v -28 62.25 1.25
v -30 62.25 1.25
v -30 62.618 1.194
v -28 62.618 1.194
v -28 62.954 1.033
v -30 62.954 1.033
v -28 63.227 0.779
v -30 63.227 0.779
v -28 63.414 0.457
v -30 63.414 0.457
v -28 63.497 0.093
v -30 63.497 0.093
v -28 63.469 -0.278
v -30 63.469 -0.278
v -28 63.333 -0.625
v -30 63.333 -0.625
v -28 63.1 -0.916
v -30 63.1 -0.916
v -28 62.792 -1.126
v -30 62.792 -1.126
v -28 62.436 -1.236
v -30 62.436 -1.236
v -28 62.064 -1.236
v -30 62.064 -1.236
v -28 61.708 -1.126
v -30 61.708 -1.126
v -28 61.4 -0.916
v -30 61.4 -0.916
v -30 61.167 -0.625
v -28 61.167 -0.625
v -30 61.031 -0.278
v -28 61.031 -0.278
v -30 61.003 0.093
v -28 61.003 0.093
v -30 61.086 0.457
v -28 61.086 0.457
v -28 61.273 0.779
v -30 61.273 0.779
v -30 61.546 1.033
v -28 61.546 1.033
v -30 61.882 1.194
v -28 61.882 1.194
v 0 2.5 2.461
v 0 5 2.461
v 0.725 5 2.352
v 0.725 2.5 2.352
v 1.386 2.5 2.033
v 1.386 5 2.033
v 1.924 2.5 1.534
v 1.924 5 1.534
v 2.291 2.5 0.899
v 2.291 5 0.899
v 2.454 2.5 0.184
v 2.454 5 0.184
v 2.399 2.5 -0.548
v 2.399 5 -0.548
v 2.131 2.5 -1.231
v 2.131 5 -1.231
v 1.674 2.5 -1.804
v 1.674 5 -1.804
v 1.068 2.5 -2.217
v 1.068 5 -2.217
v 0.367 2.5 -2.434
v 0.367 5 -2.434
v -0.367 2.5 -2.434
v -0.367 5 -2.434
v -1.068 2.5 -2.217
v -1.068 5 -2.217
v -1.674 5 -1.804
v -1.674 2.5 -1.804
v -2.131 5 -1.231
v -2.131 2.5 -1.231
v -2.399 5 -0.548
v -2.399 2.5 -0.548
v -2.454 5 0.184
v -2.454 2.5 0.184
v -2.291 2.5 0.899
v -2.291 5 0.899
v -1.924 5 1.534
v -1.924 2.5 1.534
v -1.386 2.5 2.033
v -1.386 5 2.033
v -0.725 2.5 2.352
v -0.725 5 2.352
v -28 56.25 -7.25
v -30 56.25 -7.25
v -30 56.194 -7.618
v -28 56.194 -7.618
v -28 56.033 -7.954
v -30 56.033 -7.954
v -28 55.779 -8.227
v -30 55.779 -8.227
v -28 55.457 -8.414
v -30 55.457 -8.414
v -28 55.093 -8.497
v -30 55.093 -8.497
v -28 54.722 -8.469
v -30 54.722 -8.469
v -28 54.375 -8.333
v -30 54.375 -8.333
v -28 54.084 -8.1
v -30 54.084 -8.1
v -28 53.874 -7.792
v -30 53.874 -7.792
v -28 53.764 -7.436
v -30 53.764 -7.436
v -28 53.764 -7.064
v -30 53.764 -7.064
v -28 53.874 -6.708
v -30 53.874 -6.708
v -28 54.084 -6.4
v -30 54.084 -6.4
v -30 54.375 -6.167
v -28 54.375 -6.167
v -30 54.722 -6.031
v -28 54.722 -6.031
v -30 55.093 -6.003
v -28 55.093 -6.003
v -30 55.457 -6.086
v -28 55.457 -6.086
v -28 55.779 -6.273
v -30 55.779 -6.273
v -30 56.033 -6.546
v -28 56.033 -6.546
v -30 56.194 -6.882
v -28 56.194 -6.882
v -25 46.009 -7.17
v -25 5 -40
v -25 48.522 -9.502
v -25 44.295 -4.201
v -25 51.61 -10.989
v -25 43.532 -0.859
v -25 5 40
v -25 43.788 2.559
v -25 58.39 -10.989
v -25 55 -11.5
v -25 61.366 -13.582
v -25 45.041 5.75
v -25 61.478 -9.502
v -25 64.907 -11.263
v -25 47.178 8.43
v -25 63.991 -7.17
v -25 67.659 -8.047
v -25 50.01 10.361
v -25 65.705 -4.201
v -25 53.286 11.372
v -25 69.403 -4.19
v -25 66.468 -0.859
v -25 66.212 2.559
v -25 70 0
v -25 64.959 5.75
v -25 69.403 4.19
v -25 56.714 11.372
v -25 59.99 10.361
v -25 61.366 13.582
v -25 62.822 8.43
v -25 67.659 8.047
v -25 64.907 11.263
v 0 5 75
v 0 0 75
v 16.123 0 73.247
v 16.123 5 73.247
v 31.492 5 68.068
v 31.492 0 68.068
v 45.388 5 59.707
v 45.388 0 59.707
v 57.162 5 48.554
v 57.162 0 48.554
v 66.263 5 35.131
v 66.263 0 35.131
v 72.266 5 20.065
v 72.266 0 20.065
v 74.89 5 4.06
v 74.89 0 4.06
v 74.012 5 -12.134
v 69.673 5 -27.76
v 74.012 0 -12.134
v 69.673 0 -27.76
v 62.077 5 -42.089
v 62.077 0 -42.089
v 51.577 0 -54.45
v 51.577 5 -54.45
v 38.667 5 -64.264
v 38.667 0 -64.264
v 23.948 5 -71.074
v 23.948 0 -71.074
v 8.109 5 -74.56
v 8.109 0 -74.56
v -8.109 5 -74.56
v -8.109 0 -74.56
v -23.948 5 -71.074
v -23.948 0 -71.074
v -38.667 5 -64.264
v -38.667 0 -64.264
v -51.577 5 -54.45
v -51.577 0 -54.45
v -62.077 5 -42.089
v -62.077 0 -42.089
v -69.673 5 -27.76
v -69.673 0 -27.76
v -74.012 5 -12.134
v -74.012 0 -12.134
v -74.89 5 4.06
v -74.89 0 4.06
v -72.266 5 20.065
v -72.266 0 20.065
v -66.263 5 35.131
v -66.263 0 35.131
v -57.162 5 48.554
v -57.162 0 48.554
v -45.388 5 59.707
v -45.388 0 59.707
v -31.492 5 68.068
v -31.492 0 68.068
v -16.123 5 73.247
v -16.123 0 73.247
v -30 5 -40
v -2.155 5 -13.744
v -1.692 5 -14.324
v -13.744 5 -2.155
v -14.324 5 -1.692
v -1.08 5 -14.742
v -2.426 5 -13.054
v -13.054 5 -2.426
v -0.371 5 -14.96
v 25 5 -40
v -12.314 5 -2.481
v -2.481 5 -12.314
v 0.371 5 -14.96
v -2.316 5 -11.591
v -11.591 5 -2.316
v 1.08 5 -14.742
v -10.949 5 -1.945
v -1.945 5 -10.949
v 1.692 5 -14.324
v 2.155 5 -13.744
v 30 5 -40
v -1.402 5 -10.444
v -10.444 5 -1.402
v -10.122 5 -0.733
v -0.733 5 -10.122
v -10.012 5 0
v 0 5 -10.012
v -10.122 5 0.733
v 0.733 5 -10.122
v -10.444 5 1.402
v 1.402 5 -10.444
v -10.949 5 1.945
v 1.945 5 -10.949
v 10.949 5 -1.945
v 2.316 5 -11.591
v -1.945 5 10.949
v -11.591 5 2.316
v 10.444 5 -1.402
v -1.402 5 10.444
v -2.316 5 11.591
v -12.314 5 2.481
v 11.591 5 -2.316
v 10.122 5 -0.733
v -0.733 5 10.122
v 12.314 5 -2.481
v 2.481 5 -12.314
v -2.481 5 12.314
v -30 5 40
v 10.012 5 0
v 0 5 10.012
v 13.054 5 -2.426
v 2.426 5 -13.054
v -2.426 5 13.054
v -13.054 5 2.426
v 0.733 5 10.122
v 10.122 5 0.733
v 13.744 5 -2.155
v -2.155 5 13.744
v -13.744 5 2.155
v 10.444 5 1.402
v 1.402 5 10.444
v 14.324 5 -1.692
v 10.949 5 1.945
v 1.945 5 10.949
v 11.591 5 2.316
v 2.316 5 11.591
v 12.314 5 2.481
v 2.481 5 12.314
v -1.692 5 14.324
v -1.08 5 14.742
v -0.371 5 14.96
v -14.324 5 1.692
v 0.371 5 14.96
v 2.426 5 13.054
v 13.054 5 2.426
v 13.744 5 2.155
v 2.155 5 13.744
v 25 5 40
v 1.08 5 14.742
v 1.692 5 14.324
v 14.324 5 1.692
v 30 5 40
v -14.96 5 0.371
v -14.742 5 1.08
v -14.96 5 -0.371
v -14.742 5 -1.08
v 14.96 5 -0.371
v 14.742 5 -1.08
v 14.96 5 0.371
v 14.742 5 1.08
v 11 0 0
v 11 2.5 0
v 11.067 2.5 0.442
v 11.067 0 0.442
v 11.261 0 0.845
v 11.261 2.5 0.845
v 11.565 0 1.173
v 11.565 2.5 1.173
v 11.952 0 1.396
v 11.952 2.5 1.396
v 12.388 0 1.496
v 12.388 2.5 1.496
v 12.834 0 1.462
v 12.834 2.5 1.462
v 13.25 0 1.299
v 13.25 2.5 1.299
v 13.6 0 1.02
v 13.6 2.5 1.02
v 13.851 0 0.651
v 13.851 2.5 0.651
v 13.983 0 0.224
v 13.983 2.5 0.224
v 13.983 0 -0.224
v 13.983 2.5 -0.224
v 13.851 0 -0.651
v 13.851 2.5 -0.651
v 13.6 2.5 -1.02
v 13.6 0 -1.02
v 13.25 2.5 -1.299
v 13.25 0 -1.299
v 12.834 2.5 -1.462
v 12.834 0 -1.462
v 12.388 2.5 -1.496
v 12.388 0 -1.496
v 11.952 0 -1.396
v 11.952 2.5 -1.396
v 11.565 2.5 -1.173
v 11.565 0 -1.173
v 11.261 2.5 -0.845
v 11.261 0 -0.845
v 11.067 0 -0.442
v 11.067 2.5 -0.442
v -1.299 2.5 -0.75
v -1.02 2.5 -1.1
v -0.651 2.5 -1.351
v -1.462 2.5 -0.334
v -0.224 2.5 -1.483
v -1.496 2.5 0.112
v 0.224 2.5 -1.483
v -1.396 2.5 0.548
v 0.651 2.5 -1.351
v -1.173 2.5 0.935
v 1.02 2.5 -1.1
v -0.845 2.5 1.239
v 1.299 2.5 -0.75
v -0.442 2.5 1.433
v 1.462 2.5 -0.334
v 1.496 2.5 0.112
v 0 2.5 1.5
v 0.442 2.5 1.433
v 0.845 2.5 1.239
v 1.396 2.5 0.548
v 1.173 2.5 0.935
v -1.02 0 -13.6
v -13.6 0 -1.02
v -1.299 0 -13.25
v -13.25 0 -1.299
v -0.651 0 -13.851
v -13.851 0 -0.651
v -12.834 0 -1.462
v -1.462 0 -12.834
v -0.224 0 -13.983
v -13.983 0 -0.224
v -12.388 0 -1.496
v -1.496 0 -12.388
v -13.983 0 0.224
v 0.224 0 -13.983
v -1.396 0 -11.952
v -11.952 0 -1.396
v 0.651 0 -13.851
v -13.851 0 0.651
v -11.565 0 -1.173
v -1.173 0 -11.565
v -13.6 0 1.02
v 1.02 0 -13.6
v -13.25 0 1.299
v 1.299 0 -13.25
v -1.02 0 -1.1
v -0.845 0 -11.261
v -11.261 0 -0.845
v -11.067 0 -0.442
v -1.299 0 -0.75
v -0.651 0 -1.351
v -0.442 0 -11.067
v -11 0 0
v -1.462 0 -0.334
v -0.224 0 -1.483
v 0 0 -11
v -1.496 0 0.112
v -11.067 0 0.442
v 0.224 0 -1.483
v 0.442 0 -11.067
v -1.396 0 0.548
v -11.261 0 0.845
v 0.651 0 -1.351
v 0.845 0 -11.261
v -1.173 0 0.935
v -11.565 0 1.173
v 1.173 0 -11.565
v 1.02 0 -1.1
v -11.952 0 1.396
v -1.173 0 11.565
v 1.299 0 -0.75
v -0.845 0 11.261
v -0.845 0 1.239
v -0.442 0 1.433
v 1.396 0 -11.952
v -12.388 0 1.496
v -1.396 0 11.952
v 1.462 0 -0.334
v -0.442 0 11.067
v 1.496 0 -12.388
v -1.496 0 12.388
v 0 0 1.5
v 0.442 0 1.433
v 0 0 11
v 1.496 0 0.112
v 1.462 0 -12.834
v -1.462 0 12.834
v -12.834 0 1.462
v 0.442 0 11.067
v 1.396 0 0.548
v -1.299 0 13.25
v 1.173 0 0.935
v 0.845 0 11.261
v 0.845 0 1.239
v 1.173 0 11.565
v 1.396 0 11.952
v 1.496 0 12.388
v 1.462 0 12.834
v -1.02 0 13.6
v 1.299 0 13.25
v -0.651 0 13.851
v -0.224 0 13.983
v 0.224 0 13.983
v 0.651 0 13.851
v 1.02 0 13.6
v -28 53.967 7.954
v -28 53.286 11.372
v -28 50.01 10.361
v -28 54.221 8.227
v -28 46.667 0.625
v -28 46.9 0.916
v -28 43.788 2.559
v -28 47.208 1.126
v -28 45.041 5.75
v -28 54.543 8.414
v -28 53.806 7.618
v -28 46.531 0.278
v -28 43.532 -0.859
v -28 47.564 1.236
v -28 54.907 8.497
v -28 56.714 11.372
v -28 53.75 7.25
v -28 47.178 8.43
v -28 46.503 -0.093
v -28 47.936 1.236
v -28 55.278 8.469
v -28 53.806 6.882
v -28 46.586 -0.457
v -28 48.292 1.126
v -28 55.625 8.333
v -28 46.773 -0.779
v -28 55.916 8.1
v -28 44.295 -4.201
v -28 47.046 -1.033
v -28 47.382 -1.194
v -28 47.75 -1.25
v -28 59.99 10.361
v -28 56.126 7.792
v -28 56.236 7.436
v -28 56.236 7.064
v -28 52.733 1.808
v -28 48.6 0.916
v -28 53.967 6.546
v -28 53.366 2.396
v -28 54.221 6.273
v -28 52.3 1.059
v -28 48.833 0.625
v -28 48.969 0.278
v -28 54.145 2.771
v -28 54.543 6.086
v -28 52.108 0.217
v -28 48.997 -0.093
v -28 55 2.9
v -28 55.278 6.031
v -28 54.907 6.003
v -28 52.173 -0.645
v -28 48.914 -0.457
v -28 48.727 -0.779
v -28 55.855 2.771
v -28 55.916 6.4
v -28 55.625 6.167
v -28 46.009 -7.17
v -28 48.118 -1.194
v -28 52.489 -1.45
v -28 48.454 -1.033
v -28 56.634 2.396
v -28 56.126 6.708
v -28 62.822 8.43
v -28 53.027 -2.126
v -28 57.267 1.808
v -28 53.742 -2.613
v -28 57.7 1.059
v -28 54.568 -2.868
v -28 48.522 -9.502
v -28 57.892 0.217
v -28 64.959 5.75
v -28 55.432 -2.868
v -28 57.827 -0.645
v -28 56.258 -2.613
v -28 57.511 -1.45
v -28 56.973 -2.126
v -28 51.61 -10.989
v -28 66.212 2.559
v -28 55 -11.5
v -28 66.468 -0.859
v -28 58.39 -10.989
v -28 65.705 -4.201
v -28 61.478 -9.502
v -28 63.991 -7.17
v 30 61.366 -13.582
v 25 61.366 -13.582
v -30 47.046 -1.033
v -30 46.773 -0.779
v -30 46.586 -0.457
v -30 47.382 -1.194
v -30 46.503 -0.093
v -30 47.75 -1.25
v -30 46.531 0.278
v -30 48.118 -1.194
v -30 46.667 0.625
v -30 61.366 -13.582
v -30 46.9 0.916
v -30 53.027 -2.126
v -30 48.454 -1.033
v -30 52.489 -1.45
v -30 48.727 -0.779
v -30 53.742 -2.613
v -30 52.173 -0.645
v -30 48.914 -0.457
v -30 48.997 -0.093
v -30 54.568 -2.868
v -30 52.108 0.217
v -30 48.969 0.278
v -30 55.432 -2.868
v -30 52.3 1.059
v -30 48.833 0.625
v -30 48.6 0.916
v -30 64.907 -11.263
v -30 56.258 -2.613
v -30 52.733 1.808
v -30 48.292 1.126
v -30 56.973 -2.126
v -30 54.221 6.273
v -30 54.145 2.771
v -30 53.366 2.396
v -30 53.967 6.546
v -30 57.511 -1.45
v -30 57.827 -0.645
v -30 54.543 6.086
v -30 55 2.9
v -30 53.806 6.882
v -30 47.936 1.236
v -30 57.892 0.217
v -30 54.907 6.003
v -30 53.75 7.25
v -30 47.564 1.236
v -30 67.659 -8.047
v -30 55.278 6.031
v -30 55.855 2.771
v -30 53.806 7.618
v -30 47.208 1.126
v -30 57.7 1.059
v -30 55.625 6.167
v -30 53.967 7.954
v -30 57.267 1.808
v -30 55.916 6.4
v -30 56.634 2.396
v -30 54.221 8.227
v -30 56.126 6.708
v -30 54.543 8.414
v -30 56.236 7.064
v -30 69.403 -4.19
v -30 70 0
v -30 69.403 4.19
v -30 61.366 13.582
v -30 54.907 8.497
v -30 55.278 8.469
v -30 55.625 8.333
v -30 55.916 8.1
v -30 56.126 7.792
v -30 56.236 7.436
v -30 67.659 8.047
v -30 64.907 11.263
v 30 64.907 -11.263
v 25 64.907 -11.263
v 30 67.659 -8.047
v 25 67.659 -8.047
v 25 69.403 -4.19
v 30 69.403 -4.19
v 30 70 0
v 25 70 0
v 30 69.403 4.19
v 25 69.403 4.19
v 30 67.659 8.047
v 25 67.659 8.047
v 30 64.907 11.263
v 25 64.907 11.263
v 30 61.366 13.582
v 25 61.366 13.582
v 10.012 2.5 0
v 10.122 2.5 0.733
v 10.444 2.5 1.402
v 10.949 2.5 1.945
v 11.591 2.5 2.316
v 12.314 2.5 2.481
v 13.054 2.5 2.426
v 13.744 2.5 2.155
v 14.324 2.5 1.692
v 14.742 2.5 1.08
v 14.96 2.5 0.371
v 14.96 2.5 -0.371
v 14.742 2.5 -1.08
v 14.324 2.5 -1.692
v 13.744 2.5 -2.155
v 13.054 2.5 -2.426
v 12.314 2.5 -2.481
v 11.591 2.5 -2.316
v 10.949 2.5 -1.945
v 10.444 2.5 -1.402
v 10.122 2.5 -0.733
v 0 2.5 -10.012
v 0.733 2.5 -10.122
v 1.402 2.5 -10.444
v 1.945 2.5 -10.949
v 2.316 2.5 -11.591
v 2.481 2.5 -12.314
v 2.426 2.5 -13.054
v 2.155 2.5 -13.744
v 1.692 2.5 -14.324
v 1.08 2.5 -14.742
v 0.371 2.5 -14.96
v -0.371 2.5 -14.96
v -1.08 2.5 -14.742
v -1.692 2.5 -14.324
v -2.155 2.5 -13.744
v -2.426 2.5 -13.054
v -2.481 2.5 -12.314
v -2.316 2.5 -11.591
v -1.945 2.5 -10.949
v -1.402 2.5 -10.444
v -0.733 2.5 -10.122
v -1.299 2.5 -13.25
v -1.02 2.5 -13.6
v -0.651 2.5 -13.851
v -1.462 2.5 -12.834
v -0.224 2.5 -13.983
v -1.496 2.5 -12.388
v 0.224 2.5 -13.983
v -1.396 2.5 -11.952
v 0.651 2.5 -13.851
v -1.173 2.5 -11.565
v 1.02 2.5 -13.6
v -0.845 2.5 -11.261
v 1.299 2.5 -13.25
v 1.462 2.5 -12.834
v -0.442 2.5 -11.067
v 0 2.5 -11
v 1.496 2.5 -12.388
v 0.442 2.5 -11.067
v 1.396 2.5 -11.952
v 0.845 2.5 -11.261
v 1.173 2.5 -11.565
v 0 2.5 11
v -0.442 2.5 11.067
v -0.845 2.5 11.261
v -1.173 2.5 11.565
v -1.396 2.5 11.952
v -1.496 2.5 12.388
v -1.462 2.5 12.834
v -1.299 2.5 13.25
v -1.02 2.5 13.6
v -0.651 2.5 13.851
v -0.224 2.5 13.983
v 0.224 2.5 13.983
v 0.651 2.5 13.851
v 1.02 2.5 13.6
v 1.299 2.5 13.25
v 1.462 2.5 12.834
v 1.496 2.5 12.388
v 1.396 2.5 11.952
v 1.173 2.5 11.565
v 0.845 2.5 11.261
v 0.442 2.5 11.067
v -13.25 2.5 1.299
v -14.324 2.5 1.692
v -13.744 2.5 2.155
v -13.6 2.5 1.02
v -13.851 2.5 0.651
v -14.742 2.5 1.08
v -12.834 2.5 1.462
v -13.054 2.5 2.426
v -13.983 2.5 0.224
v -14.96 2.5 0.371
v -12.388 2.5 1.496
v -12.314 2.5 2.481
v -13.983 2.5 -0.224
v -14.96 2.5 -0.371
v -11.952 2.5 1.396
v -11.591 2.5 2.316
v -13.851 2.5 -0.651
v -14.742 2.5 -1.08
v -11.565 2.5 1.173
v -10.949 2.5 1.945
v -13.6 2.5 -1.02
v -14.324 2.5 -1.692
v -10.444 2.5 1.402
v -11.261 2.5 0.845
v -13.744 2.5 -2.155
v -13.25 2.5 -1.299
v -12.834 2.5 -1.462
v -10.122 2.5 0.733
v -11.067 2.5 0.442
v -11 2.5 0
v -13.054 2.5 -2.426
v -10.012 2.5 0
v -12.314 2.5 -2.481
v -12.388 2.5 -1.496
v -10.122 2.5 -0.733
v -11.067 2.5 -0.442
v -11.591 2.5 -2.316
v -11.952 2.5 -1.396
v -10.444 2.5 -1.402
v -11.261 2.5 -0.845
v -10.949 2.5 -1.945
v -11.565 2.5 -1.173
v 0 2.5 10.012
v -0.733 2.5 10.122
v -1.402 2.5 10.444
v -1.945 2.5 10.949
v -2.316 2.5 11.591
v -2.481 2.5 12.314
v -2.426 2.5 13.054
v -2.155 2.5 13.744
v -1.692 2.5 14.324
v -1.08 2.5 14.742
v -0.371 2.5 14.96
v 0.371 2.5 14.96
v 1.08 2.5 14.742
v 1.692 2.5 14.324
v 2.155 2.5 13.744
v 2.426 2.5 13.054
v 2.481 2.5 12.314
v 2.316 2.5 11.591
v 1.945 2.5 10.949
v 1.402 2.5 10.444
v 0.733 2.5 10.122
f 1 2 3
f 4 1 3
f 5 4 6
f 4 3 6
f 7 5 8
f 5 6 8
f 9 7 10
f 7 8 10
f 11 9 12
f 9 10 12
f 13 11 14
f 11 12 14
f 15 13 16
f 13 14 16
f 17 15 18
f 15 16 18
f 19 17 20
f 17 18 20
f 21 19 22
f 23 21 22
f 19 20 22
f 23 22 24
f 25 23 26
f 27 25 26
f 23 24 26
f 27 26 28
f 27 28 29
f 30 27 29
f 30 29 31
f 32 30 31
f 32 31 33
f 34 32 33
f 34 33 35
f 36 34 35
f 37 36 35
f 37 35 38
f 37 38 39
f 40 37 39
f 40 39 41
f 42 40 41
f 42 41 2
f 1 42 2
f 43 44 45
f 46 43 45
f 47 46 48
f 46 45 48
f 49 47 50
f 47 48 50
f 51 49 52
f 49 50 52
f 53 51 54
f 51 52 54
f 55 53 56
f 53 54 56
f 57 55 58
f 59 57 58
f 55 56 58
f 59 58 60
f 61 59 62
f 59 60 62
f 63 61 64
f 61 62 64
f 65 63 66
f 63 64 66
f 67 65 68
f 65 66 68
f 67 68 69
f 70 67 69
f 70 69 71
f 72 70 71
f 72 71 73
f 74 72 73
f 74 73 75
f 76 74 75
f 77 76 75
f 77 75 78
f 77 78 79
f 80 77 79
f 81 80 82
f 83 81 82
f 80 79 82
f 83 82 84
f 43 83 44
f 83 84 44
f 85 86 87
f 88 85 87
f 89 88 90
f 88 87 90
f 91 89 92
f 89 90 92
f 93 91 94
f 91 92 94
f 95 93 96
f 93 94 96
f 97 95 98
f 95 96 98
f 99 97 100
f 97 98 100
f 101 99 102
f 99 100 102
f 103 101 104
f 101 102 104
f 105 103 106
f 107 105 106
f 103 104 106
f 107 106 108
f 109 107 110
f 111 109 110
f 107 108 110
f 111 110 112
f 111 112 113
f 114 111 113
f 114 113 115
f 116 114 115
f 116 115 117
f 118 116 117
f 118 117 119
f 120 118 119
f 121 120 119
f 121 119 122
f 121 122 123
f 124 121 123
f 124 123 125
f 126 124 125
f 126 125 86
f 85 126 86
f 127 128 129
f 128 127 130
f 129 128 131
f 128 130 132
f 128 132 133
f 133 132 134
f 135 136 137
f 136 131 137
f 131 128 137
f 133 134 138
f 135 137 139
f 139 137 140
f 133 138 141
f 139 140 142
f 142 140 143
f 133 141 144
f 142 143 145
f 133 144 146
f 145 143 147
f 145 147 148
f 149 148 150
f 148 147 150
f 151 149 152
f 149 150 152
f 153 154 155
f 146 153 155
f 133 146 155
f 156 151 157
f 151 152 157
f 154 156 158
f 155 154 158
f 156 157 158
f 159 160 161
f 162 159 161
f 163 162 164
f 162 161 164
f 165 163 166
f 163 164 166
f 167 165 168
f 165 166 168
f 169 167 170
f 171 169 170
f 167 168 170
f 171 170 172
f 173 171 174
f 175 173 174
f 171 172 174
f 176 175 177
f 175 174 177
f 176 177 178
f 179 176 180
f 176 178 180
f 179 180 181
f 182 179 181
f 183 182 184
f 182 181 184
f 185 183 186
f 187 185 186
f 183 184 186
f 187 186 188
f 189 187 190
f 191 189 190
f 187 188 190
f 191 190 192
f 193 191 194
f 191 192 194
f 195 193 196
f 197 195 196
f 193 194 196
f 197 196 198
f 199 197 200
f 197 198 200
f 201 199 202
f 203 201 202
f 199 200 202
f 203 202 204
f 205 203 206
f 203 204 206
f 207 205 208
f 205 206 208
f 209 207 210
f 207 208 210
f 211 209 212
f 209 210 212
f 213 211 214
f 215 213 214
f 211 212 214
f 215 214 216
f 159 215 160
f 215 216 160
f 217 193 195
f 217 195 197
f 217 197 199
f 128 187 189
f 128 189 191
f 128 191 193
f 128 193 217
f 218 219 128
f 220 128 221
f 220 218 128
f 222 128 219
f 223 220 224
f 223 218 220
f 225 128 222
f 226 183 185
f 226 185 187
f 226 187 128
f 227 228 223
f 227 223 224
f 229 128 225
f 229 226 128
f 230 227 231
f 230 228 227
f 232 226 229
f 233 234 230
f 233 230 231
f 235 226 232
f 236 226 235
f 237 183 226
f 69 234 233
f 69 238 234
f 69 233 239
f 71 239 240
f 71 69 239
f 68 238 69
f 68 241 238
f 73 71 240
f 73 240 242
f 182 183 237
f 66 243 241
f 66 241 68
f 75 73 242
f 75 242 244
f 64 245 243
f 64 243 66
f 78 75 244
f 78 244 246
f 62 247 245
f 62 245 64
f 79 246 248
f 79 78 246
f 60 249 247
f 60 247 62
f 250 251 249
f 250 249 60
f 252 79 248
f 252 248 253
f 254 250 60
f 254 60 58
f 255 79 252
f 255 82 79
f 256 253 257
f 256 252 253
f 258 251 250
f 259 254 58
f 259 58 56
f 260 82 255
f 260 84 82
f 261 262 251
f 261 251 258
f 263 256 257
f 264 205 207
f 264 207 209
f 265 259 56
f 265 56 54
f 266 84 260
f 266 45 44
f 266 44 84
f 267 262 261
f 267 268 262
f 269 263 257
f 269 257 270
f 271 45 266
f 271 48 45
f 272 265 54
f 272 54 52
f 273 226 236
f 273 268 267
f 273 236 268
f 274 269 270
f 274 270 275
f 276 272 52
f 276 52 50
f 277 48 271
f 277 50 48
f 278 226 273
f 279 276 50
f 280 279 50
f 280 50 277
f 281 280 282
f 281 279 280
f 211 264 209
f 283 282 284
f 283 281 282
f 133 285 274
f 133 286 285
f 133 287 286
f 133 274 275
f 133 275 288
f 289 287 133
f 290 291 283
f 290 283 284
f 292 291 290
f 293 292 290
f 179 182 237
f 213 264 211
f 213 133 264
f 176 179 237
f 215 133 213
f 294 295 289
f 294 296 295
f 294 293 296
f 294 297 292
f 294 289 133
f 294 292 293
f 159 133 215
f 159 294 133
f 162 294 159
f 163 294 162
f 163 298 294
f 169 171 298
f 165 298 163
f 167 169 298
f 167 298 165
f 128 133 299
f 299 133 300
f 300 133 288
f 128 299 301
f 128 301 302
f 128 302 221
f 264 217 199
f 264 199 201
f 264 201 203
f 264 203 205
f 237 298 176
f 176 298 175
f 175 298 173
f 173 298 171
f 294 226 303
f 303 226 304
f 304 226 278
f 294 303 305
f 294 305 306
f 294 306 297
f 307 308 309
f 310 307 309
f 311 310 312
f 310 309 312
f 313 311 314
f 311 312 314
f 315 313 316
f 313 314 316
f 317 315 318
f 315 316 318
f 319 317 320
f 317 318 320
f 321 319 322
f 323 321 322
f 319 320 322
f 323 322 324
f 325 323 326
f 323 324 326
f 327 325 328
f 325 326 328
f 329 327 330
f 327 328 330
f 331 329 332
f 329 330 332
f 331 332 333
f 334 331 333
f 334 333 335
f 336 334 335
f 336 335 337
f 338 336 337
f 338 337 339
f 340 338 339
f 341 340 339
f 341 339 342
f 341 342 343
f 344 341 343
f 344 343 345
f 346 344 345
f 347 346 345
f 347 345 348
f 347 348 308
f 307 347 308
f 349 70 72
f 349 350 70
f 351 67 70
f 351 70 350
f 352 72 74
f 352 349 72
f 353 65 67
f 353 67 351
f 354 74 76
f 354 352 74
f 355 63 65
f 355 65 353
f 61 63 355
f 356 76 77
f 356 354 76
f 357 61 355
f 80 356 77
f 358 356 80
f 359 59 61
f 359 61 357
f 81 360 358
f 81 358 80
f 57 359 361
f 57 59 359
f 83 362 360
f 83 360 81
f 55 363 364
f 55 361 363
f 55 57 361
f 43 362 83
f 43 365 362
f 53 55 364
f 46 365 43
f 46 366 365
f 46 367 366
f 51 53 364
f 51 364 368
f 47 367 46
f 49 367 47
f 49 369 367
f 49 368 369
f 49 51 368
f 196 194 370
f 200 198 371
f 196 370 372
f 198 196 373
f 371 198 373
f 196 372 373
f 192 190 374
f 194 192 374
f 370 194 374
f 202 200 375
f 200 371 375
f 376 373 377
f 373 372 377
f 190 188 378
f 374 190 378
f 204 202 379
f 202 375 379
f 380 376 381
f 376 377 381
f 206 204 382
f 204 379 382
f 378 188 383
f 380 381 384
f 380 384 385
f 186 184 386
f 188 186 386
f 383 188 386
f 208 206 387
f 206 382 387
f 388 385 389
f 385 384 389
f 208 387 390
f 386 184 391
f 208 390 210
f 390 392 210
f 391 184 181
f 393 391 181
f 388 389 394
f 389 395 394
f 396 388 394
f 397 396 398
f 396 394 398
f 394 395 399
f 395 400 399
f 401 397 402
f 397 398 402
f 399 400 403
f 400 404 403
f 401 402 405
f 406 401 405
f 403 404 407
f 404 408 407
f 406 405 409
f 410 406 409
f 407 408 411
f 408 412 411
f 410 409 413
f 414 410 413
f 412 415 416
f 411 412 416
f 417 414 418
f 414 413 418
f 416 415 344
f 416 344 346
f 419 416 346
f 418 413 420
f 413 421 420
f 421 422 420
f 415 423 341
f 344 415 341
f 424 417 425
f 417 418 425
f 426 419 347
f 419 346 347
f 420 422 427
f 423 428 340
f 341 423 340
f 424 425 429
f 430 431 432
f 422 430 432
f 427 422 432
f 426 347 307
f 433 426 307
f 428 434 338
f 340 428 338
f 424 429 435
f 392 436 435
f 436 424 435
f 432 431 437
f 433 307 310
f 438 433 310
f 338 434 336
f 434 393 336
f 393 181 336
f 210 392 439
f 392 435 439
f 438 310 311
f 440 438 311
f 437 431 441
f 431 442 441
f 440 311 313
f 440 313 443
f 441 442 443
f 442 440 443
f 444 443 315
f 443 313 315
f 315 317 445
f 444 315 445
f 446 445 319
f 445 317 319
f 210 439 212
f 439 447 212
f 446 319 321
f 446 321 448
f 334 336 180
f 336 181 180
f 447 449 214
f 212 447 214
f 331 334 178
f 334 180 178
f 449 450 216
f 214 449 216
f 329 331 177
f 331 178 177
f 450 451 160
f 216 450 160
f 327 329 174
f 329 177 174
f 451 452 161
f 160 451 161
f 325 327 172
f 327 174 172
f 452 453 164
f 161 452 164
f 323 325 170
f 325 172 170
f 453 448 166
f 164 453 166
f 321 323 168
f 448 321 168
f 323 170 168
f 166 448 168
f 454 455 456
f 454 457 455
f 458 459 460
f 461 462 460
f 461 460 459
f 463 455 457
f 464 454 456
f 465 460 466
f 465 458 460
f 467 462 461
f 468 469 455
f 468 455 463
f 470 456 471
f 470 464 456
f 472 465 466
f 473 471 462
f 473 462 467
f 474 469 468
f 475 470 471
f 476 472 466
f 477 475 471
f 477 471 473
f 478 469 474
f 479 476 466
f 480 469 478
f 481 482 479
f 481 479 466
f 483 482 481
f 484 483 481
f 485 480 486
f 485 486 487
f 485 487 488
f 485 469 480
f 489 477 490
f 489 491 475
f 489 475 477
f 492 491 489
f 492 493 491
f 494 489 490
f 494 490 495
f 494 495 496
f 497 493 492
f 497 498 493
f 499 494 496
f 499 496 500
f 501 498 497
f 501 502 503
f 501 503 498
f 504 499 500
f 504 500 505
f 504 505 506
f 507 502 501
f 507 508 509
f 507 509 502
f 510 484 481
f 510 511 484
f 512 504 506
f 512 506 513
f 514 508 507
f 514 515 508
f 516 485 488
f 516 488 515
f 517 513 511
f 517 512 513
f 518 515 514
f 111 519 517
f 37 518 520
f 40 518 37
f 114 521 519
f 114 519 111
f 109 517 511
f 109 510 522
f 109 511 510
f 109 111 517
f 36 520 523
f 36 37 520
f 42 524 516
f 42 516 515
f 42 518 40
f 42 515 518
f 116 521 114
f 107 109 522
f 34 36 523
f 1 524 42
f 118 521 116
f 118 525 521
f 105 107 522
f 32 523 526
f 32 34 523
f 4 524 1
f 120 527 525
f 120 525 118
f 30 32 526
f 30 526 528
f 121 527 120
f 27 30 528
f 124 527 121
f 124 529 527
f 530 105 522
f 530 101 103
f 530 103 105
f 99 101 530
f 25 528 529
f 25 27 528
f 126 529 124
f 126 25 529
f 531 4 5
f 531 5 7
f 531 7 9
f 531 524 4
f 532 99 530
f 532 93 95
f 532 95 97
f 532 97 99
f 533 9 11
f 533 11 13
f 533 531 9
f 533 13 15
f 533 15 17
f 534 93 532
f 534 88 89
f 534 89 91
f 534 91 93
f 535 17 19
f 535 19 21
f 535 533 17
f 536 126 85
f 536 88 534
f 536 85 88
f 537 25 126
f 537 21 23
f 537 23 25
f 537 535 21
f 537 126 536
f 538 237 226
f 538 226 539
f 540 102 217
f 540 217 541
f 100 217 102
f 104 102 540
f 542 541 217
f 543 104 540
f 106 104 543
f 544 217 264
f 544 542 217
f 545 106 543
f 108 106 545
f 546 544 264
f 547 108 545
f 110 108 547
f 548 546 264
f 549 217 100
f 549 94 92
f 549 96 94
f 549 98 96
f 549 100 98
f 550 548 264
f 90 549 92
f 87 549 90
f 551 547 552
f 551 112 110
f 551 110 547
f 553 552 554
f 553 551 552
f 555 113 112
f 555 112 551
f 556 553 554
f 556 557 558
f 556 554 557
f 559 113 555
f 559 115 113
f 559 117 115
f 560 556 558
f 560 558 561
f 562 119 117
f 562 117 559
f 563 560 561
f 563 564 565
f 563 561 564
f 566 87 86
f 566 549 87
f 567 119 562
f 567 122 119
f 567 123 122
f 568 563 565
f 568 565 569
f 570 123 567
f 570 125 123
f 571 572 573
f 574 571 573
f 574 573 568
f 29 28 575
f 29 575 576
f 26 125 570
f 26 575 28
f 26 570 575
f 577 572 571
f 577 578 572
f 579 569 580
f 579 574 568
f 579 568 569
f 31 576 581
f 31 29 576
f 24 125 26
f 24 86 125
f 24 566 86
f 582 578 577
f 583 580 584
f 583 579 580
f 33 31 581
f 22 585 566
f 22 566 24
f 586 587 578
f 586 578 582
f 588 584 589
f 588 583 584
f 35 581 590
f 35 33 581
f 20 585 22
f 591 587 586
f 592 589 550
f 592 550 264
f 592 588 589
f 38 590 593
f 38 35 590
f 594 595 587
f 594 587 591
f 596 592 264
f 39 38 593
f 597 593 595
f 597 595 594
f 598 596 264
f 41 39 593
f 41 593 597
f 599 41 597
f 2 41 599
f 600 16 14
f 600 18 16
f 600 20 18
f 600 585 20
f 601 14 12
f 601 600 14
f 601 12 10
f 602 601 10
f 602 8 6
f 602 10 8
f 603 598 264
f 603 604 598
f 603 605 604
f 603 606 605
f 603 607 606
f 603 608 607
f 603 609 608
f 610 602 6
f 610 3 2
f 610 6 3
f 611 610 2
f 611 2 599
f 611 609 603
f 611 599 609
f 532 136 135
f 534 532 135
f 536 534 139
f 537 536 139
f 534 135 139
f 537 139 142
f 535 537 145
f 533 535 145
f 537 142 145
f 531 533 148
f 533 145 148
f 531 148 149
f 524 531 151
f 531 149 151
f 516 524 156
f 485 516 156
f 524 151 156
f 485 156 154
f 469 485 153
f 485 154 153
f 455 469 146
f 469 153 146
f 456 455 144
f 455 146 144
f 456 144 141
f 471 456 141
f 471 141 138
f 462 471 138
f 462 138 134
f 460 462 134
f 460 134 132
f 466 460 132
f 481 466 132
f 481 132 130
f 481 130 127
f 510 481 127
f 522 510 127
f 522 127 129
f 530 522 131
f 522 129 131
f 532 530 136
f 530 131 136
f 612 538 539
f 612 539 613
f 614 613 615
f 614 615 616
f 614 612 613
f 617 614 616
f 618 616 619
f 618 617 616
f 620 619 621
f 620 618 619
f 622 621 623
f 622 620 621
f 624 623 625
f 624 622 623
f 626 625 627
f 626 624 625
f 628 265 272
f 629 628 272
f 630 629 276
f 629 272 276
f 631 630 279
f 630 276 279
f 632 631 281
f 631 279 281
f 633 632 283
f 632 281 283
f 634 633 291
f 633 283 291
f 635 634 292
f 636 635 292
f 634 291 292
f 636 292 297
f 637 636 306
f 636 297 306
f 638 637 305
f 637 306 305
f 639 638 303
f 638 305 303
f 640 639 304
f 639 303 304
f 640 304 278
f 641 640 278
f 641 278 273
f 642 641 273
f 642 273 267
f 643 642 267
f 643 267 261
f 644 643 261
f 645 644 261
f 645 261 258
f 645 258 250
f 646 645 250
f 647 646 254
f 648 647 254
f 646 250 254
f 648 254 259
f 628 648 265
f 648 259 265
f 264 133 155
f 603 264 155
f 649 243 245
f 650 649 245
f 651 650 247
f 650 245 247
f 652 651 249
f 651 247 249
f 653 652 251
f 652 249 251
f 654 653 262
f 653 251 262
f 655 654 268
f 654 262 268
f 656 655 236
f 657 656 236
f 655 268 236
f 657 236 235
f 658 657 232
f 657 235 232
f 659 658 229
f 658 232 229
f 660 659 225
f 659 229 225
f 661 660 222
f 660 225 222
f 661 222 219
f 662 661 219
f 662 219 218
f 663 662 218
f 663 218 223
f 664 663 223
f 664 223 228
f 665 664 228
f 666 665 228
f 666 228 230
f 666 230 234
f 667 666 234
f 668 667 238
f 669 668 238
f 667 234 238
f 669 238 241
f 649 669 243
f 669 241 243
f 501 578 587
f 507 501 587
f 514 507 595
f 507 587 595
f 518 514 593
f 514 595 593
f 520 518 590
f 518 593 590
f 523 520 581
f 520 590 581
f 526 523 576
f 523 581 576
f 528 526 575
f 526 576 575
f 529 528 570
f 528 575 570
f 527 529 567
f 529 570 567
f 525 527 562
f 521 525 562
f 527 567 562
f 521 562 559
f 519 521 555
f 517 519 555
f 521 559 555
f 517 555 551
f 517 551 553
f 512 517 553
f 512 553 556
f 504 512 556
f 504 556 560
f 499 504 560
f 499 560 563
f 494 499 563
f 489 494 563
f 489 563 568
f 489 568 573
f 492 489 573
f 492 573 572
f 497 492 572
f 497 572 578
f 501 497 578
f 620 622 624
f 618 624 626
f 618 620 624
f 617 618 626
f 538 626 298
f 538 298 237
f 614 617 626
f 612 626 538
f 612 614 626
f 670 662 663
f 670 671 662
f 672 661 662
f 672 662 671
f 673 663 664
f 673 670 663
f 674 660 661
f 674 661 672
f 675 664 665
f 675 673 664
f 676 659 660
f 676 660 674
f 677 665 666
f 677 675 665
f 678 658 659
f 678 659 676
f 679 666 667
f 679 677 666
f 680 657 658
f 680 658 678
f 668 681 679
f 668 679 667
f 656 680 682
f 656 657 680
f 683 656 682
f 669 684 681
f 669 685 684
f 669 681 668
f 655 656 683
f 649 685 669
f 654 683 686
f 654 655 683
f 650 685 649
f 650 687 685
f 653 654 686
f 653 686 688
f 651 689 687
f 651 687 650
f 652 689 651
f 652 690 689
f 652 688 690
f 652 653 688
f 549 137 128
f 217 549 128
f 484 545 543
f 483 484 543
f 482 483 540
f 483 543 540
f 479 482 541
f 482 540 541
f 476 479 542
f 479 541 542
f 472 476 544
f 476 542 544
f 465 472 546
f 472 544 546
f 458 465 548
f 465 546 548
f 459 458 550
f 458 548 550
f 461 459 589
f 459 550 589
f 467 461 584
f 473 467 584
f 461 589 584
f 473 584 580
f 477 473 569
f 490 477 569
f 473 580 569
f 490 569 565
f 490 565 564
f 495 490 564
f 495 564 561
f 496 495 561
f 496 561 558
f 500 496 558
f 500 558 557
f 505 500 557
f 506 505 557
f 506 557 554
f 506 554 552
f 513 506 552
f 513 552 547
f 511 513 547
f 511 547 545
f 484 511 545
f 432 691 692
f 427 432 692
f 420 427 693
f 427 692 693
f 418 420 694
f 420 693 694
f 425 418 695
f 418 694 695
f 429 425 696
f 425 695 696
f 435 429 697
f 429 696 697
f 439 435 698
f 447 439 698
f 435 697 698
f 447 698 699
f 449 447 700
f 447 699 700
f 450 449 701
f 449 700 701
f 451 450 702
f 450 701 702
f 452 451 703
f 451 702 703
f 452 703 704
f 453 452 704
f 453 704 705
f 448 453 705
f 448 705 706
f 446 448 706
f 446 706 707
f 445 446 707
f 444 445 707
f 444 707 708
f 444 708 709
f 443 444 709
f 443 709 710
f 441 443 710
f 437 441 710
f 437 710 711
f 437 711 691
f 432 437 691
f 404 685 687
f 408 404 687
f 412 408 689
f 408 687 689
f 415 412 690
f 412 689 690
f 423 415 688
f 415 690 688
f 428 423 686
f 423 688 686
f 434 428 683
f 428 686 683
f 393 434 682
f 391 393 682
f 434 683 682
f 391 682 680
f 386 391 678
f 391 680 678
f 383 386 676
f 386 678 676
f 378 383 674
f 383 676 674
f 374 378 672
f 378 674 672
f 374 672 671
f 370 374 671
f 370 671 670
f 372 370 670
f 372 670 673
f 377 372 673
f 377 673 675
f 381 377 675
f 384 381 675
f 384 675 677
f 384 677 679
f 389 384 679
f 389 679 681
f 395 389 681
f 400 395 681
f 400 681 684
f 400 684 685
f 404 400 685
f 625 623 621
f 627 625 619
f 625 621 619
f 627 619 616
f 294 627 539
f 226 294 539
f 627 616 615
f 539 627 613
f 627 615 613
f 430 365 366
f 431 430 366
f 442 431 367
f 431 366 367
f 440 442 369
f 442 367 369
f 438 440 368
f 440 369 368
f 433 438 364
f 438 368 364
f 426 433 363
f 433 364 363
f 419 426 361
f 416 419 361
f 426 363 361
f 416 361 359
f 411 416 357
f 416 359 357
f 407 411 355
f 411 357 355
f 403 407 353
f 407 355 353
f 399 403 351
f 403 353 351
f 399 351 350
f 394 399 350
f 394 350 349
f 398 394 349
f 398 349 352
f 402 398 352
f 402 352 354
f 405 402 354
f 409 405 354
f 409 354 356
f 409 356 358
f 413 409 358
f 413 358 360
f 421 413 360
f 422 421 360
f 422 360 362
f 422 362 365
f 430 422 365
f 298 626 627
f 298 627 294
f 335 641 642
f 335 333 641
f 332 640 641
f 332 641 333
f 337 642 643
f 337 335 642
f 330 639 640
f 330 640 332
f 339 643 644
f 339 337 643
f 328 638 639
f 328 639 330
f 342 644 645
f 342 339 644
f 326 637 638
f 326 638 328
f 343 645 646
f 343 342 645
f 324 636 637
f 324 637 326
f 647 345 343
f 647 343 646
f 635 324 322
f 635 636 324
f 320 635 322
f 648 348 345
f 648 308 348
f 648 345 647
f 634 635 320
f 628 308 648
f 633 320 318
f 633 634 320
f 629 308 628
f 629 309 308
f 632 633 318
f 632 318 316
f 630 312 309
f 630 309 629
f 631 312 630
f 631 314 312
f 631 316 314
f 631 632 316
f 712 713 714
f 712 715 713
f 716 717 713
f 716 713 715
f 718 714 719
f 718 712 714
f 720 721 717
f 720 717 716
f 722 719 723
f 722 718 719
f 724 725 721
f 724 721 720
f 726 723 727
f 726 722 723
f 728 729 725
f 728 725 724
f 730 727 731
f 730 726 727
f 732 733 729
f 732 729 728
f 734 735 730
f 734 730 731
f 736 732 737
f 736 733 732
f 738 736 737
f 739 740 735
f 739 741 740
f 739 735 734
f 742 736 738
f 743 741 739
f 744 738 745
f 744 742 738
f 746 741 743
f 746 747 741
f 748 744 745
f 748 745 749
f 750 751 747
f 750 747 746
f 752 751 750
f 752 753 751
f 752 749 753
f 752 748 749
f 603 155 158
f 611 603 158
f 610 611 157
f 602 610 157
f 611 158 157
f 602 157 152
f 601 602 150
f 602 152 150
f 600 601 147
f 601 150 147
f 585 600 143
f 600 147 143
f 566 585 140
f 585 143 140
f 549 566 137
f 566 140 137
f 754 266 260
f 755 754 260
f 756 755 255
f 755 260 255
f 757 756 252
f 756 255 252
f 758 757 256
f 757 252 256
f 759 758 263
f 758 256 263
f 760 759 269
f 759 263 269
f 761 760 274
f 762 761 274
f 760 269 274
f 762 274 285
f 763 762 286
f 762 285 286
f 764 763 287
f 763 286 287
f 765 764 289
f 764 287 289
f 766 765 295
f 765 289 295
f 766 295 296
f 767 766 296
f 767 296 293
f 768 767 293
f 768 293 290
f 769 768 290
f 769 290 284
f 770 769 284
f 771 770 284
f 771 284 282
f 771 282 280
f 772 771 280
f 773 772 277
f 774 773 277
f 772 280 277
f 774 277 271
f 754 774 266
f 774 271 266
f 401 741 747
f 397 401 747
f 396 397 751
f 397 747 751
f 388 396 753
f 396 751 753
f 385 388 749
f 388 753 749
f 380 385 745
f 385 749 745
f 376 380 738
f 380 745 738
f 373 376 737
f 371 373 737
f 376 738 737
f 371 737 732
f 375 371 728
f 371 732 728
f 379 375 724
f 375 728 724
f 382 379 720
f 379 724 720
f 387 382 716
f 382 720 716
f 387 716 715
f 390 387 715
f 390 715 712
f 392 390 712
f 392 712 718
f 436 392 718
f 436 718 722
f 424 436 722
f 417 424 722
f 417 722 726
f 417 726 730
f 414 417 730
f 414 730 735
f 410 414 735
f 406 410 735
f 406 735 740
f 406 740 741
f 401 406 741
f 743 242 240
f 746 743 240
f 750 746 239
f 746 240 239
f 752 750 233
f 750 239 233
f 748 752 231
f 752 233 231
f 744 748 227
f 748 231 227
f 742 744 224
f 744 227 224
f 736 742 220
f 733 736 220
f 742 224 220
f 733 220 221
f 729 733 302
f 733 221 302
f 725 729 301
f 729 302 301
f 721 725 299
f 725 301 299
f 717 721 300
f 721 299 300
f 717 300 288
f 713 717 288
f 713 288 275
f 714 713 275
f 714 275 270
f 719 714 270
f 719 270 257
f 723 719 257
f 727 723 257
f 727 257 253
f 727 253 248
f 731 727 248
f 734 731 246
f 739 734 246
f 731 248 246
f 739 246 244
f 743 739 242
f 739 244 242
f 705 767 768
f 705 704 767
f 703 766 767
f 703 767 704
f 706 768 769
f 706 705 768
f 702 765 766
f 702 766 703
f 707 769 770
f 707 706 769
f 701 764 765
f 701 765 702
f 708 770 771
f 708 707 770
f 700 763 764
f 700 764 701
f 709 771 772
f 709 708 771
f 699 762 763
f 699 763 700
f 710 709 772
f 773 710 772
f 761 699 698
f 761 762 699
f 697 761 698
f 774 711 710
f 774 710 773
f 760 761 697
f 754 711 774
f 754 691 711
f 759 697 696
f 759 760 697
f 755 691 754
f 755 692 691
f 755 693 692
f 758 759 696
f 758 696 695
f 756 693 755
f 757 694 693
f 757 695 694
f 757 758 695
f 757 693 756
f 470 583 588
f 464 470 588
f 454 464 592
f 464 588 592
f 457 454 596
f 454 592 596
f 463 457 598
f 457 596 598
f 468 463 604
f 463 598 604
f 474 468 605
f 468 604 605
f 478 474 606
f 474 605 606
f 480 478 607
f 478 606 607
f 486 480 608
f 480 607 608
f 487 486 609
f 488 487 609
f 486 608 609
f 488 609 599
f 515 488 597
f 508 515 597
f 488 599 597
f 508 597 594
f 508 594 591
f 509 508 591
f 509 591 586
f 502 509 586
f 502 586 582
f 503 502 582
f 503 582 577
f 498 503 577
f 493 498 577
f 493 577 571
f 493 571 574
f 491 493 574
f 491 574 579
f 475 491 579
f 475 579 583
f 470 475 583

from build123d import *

# Parameters (mm, degrees)
SKETCH1_R           = 75
BOSS_EXTRUDE1_DEPTH = 5
BOSS_EXTRUDE2_DEPTH = 5
BOSS_EXTRUDE3_START = -5
BOSS_EXTRUDE3_DEPTH = 5
SKETCH6_R           = 1.5
CUT_EXTRUDE1_DEPTH  = 5
SKETCH7_R           = 2.9
CUT_EXTRUDE2_DEPTH  = 2.5
SKETCH8_R           = 0.6
CUT_EXTRUDE3_DEPTH  = 5
CIRPATTERN1_COUNT   = 4
SKETCH10_R          = 1.25
CUT_EXTRUDE4_DEPTH  = 3
CIRPATTERN2_COUNT   = 4
SKETCH11_R          = 1.5
CUT_EXTRUDE5_DEPTH  = 5
SKETCH12_R          = 1.5
CUT_EXTRUDE6_DEPTH  = 5
CIRPATTERN3_COUNT   = 4
SKETCH13_R          = 2.488262112
CUT_EXTRUDE7_DEPTH  = 2.5
CIRPATTERN4_COUNT   = 4
SKETCH14_R          = 2.461092264
CUT_EXTRUDE8_DEPTH  = 2.5
SKETCH16_R          = 11.5
CUT_EXTRUDE10_DEPTH = 3


with BuildPart() as part:
    # Sketch1 → Boss-Extrude1 (new body)
    with BuildSketch(Plane(origin=(0, 0, 0), x_dir=(1, 0, 0), z_dir=(0, 1, 0))):
        with Locations(Location((0, 0, 0), (0, 0, 270))):
            Circle(SKETCH1_R)
    extrude(amount=BOSS_EXTRUDE1_DEPTH)

    # Sketch4 → Boss-Extrude2 (add)
    with BuildSketch(Plane.ZY.offset(25)):
        with BuildLine():
            Line((-13.582225242, 61.365780194), (-40, 5))
            Line((-40, 5), (40, 5))
            Line((40, 5), (13.582225242, 61.365780194))
            ThreePointArc((13.582225242, 61.365780194), (0, 70), (-13.582225242, 61.365780194))
        make_face()
    extrude(amount=BOSS_EXTRUDE2_DEPTH)

    # Sketch5 → Boss-Extrude3 (add)
    with BuildSketch(Plane.ZY.offset(-25).offset(BOSS_EXTRUDE3_START)):
        with BuildLine():
            Line((13.582225242, 61.365780194), (40, 5))
            Line((40, 5), (-40, 5))
            Line((-40, 5), (-13.582225242, 61.365780194))
            ThreePointArc((-13.582225242, 61.365780194), (0, 70), (13.582225242, 61.365780194))
        make_face()
    extrude(amount=BOSS_EXTRUDE3_DEPTH)

    # Sketch6 → Cut-Extrude1 (cut)
    with BuildSketch(Plane.ZY.offset(30)):
        with Locations((0, 55)):
            Circle(SKETCH6_R)
    extrude(amount=-CUT_EXTRUDE1_DEPTH, mode=Mode.SUBTRACT)

    # Sketch7 → Cut-Extrude2 (cut)
    with BuildSketch(Plane.ZY.offset(30)):
        with Locations((0, 55)):
            Circle(SKETCH7_R)
    extrude(amount=-CUT_EXTRUDE2_DEPTH, mode=Mode.SUBTRACT)

    # Sketch8 → Cut-Extrude3 (cut)
    with BuildSketch(Plane.ZY.offset(30)):
        with Locations((0, 62.25)):
            Circle(SKETCH8_R)
    cut_extrude3 = extrude(amount=-CUT_EXTRUDE3_DEPTH, mode=Mode.SUBTRACT)

    # CirPattern1: Cut-Extrude3 ×4 about axis
    cirpattern1_axis = Axis((0, 55, 0), (1, 0, 0))
    for i in range(1, CIRPATTERN1_COUNT):
        add(cut_extrude3.rotate(cirpattern1_axis, i * 360 / CIRPATTERN1_COUNT), mode=Mode.SUBTRACT)

    # Sketch10 → Cut-Extrude4 (cut)
    with BuildSketch(Plane.ZY.offset(30)):
        with Locations((0, 62.25)):
            Circle(SKETCH10_R)
    cut_extrude4 = extrude(amount=-CUT_EXTRUDE4_DEPTH, mode=Mode.SUBTRACT)

    # CirPattern2: Cut-Extrude4 ×4 about axis
    cirpattern2_axis = Axis((0, 55, 0), (1, 0, 0))
    for i in range(1, CIRPATTERN2_COUNT):
        add(cut_extrude4.rotate(cirpattern2_axis, i * 360 / CIRPATTERN2_COUNT), mode=Mode.SUBTRACT)

    # Sketch11 → Cut-Extrude5 (cut)
    with BuildSketch(Plane(origin=(0, 5, 0), x_dir=(1, 0, 0), z_dir=(0, 1, 0))):
        with Locations(Location((0, 0, 0), (0, 0, 270))):
            Circle(SKETCH11_R)
    extrude(amount=-CUT_EXTRUDE5_DEPTH, mode=Mode.SUBTRACT)

    # Sketch12 → Cut-Extrude6 (cut)
    with BuildSketch(Plane(origin=(0, 5, 0), x_dir=(1, 0, 0), z_dir=(0, 1, 0))):
        with Locations(Location((0, 12.5, 0), (0, 0, 270))):
            Circle(SKETCH12_R)
    cut_extrude6 = extrude(amount=-CUT_EXTRUDE6_DEPTH, mode=Mode.SUBTRACT)

    # CirPattern3: Cut-Extrude6 ×4 about axis
    cirpattern3_axis = Axis((0, 0, 0), (0, 1, 0))
    for i in range(1, CIRPATTERN3_COUNT):
        add(cut_extrude6.rotate(cirpattern3_axis, i * 360 / CIRPATTERN3_COUNT), mode=Mode.SUBTRACT)

    # Sketch13 → Cut-Extrude7 (cut)
    with BuildSketch(Plane(origin=(0, 5, 0), x_dir=(1, 0, 0), z_dir=(0, 1, 0))):
        with Locations(Location((0, 12.5, 0), (0, 0, 270))):
            Circle(SKETCH13_R)
    cut_extrude7 = extrude(amount=-CUT_EXTRUDE7_DEPTH, mode=Mode.SUBTRACT)

    # CirPattern4: Cut-Extrude7 ×4 about axis
    cirpattern4_axis = Axis((0, 0, 0), (0, 1, 0))
    for i in range(1, CIRPATTERN4_COUNT):
        add(cut_extrude7.rotate(cirpattern4_axis, i * 360 / CIRPATTERN4_COUNT), mode=Mode.SUBTRACT)

    # Sketch14 → Cut-Extrude8 (cut)
    with BuildSketch(Plane(origin=(0, 5, 0), x_dir=(1, 0, 0), z_dir=(0, 1, 0))):
        with Locations(Location((0, 0, 0), (0, 0, 270))):
            Circle(SKETCH14_R)
    extrude(amount=-CUT_EXTRUDE8_DEPTH, mode=Mode.SUBTRACT)

    # Sketch16 → Cut-Extrude10 (cut)
    with BuildSketch(Plane(origin=(-25, 0, 0), x_dir=(0, 0, -1), z_dir=(1, 0, 0))):
        with Locations((0, 55)):
            Circle(SKETCH16_R)
    extrude(amount=-CUT_EXTRUDE10_DEPTH, mode=Mode.SUBTRACT)


solid = part.part
